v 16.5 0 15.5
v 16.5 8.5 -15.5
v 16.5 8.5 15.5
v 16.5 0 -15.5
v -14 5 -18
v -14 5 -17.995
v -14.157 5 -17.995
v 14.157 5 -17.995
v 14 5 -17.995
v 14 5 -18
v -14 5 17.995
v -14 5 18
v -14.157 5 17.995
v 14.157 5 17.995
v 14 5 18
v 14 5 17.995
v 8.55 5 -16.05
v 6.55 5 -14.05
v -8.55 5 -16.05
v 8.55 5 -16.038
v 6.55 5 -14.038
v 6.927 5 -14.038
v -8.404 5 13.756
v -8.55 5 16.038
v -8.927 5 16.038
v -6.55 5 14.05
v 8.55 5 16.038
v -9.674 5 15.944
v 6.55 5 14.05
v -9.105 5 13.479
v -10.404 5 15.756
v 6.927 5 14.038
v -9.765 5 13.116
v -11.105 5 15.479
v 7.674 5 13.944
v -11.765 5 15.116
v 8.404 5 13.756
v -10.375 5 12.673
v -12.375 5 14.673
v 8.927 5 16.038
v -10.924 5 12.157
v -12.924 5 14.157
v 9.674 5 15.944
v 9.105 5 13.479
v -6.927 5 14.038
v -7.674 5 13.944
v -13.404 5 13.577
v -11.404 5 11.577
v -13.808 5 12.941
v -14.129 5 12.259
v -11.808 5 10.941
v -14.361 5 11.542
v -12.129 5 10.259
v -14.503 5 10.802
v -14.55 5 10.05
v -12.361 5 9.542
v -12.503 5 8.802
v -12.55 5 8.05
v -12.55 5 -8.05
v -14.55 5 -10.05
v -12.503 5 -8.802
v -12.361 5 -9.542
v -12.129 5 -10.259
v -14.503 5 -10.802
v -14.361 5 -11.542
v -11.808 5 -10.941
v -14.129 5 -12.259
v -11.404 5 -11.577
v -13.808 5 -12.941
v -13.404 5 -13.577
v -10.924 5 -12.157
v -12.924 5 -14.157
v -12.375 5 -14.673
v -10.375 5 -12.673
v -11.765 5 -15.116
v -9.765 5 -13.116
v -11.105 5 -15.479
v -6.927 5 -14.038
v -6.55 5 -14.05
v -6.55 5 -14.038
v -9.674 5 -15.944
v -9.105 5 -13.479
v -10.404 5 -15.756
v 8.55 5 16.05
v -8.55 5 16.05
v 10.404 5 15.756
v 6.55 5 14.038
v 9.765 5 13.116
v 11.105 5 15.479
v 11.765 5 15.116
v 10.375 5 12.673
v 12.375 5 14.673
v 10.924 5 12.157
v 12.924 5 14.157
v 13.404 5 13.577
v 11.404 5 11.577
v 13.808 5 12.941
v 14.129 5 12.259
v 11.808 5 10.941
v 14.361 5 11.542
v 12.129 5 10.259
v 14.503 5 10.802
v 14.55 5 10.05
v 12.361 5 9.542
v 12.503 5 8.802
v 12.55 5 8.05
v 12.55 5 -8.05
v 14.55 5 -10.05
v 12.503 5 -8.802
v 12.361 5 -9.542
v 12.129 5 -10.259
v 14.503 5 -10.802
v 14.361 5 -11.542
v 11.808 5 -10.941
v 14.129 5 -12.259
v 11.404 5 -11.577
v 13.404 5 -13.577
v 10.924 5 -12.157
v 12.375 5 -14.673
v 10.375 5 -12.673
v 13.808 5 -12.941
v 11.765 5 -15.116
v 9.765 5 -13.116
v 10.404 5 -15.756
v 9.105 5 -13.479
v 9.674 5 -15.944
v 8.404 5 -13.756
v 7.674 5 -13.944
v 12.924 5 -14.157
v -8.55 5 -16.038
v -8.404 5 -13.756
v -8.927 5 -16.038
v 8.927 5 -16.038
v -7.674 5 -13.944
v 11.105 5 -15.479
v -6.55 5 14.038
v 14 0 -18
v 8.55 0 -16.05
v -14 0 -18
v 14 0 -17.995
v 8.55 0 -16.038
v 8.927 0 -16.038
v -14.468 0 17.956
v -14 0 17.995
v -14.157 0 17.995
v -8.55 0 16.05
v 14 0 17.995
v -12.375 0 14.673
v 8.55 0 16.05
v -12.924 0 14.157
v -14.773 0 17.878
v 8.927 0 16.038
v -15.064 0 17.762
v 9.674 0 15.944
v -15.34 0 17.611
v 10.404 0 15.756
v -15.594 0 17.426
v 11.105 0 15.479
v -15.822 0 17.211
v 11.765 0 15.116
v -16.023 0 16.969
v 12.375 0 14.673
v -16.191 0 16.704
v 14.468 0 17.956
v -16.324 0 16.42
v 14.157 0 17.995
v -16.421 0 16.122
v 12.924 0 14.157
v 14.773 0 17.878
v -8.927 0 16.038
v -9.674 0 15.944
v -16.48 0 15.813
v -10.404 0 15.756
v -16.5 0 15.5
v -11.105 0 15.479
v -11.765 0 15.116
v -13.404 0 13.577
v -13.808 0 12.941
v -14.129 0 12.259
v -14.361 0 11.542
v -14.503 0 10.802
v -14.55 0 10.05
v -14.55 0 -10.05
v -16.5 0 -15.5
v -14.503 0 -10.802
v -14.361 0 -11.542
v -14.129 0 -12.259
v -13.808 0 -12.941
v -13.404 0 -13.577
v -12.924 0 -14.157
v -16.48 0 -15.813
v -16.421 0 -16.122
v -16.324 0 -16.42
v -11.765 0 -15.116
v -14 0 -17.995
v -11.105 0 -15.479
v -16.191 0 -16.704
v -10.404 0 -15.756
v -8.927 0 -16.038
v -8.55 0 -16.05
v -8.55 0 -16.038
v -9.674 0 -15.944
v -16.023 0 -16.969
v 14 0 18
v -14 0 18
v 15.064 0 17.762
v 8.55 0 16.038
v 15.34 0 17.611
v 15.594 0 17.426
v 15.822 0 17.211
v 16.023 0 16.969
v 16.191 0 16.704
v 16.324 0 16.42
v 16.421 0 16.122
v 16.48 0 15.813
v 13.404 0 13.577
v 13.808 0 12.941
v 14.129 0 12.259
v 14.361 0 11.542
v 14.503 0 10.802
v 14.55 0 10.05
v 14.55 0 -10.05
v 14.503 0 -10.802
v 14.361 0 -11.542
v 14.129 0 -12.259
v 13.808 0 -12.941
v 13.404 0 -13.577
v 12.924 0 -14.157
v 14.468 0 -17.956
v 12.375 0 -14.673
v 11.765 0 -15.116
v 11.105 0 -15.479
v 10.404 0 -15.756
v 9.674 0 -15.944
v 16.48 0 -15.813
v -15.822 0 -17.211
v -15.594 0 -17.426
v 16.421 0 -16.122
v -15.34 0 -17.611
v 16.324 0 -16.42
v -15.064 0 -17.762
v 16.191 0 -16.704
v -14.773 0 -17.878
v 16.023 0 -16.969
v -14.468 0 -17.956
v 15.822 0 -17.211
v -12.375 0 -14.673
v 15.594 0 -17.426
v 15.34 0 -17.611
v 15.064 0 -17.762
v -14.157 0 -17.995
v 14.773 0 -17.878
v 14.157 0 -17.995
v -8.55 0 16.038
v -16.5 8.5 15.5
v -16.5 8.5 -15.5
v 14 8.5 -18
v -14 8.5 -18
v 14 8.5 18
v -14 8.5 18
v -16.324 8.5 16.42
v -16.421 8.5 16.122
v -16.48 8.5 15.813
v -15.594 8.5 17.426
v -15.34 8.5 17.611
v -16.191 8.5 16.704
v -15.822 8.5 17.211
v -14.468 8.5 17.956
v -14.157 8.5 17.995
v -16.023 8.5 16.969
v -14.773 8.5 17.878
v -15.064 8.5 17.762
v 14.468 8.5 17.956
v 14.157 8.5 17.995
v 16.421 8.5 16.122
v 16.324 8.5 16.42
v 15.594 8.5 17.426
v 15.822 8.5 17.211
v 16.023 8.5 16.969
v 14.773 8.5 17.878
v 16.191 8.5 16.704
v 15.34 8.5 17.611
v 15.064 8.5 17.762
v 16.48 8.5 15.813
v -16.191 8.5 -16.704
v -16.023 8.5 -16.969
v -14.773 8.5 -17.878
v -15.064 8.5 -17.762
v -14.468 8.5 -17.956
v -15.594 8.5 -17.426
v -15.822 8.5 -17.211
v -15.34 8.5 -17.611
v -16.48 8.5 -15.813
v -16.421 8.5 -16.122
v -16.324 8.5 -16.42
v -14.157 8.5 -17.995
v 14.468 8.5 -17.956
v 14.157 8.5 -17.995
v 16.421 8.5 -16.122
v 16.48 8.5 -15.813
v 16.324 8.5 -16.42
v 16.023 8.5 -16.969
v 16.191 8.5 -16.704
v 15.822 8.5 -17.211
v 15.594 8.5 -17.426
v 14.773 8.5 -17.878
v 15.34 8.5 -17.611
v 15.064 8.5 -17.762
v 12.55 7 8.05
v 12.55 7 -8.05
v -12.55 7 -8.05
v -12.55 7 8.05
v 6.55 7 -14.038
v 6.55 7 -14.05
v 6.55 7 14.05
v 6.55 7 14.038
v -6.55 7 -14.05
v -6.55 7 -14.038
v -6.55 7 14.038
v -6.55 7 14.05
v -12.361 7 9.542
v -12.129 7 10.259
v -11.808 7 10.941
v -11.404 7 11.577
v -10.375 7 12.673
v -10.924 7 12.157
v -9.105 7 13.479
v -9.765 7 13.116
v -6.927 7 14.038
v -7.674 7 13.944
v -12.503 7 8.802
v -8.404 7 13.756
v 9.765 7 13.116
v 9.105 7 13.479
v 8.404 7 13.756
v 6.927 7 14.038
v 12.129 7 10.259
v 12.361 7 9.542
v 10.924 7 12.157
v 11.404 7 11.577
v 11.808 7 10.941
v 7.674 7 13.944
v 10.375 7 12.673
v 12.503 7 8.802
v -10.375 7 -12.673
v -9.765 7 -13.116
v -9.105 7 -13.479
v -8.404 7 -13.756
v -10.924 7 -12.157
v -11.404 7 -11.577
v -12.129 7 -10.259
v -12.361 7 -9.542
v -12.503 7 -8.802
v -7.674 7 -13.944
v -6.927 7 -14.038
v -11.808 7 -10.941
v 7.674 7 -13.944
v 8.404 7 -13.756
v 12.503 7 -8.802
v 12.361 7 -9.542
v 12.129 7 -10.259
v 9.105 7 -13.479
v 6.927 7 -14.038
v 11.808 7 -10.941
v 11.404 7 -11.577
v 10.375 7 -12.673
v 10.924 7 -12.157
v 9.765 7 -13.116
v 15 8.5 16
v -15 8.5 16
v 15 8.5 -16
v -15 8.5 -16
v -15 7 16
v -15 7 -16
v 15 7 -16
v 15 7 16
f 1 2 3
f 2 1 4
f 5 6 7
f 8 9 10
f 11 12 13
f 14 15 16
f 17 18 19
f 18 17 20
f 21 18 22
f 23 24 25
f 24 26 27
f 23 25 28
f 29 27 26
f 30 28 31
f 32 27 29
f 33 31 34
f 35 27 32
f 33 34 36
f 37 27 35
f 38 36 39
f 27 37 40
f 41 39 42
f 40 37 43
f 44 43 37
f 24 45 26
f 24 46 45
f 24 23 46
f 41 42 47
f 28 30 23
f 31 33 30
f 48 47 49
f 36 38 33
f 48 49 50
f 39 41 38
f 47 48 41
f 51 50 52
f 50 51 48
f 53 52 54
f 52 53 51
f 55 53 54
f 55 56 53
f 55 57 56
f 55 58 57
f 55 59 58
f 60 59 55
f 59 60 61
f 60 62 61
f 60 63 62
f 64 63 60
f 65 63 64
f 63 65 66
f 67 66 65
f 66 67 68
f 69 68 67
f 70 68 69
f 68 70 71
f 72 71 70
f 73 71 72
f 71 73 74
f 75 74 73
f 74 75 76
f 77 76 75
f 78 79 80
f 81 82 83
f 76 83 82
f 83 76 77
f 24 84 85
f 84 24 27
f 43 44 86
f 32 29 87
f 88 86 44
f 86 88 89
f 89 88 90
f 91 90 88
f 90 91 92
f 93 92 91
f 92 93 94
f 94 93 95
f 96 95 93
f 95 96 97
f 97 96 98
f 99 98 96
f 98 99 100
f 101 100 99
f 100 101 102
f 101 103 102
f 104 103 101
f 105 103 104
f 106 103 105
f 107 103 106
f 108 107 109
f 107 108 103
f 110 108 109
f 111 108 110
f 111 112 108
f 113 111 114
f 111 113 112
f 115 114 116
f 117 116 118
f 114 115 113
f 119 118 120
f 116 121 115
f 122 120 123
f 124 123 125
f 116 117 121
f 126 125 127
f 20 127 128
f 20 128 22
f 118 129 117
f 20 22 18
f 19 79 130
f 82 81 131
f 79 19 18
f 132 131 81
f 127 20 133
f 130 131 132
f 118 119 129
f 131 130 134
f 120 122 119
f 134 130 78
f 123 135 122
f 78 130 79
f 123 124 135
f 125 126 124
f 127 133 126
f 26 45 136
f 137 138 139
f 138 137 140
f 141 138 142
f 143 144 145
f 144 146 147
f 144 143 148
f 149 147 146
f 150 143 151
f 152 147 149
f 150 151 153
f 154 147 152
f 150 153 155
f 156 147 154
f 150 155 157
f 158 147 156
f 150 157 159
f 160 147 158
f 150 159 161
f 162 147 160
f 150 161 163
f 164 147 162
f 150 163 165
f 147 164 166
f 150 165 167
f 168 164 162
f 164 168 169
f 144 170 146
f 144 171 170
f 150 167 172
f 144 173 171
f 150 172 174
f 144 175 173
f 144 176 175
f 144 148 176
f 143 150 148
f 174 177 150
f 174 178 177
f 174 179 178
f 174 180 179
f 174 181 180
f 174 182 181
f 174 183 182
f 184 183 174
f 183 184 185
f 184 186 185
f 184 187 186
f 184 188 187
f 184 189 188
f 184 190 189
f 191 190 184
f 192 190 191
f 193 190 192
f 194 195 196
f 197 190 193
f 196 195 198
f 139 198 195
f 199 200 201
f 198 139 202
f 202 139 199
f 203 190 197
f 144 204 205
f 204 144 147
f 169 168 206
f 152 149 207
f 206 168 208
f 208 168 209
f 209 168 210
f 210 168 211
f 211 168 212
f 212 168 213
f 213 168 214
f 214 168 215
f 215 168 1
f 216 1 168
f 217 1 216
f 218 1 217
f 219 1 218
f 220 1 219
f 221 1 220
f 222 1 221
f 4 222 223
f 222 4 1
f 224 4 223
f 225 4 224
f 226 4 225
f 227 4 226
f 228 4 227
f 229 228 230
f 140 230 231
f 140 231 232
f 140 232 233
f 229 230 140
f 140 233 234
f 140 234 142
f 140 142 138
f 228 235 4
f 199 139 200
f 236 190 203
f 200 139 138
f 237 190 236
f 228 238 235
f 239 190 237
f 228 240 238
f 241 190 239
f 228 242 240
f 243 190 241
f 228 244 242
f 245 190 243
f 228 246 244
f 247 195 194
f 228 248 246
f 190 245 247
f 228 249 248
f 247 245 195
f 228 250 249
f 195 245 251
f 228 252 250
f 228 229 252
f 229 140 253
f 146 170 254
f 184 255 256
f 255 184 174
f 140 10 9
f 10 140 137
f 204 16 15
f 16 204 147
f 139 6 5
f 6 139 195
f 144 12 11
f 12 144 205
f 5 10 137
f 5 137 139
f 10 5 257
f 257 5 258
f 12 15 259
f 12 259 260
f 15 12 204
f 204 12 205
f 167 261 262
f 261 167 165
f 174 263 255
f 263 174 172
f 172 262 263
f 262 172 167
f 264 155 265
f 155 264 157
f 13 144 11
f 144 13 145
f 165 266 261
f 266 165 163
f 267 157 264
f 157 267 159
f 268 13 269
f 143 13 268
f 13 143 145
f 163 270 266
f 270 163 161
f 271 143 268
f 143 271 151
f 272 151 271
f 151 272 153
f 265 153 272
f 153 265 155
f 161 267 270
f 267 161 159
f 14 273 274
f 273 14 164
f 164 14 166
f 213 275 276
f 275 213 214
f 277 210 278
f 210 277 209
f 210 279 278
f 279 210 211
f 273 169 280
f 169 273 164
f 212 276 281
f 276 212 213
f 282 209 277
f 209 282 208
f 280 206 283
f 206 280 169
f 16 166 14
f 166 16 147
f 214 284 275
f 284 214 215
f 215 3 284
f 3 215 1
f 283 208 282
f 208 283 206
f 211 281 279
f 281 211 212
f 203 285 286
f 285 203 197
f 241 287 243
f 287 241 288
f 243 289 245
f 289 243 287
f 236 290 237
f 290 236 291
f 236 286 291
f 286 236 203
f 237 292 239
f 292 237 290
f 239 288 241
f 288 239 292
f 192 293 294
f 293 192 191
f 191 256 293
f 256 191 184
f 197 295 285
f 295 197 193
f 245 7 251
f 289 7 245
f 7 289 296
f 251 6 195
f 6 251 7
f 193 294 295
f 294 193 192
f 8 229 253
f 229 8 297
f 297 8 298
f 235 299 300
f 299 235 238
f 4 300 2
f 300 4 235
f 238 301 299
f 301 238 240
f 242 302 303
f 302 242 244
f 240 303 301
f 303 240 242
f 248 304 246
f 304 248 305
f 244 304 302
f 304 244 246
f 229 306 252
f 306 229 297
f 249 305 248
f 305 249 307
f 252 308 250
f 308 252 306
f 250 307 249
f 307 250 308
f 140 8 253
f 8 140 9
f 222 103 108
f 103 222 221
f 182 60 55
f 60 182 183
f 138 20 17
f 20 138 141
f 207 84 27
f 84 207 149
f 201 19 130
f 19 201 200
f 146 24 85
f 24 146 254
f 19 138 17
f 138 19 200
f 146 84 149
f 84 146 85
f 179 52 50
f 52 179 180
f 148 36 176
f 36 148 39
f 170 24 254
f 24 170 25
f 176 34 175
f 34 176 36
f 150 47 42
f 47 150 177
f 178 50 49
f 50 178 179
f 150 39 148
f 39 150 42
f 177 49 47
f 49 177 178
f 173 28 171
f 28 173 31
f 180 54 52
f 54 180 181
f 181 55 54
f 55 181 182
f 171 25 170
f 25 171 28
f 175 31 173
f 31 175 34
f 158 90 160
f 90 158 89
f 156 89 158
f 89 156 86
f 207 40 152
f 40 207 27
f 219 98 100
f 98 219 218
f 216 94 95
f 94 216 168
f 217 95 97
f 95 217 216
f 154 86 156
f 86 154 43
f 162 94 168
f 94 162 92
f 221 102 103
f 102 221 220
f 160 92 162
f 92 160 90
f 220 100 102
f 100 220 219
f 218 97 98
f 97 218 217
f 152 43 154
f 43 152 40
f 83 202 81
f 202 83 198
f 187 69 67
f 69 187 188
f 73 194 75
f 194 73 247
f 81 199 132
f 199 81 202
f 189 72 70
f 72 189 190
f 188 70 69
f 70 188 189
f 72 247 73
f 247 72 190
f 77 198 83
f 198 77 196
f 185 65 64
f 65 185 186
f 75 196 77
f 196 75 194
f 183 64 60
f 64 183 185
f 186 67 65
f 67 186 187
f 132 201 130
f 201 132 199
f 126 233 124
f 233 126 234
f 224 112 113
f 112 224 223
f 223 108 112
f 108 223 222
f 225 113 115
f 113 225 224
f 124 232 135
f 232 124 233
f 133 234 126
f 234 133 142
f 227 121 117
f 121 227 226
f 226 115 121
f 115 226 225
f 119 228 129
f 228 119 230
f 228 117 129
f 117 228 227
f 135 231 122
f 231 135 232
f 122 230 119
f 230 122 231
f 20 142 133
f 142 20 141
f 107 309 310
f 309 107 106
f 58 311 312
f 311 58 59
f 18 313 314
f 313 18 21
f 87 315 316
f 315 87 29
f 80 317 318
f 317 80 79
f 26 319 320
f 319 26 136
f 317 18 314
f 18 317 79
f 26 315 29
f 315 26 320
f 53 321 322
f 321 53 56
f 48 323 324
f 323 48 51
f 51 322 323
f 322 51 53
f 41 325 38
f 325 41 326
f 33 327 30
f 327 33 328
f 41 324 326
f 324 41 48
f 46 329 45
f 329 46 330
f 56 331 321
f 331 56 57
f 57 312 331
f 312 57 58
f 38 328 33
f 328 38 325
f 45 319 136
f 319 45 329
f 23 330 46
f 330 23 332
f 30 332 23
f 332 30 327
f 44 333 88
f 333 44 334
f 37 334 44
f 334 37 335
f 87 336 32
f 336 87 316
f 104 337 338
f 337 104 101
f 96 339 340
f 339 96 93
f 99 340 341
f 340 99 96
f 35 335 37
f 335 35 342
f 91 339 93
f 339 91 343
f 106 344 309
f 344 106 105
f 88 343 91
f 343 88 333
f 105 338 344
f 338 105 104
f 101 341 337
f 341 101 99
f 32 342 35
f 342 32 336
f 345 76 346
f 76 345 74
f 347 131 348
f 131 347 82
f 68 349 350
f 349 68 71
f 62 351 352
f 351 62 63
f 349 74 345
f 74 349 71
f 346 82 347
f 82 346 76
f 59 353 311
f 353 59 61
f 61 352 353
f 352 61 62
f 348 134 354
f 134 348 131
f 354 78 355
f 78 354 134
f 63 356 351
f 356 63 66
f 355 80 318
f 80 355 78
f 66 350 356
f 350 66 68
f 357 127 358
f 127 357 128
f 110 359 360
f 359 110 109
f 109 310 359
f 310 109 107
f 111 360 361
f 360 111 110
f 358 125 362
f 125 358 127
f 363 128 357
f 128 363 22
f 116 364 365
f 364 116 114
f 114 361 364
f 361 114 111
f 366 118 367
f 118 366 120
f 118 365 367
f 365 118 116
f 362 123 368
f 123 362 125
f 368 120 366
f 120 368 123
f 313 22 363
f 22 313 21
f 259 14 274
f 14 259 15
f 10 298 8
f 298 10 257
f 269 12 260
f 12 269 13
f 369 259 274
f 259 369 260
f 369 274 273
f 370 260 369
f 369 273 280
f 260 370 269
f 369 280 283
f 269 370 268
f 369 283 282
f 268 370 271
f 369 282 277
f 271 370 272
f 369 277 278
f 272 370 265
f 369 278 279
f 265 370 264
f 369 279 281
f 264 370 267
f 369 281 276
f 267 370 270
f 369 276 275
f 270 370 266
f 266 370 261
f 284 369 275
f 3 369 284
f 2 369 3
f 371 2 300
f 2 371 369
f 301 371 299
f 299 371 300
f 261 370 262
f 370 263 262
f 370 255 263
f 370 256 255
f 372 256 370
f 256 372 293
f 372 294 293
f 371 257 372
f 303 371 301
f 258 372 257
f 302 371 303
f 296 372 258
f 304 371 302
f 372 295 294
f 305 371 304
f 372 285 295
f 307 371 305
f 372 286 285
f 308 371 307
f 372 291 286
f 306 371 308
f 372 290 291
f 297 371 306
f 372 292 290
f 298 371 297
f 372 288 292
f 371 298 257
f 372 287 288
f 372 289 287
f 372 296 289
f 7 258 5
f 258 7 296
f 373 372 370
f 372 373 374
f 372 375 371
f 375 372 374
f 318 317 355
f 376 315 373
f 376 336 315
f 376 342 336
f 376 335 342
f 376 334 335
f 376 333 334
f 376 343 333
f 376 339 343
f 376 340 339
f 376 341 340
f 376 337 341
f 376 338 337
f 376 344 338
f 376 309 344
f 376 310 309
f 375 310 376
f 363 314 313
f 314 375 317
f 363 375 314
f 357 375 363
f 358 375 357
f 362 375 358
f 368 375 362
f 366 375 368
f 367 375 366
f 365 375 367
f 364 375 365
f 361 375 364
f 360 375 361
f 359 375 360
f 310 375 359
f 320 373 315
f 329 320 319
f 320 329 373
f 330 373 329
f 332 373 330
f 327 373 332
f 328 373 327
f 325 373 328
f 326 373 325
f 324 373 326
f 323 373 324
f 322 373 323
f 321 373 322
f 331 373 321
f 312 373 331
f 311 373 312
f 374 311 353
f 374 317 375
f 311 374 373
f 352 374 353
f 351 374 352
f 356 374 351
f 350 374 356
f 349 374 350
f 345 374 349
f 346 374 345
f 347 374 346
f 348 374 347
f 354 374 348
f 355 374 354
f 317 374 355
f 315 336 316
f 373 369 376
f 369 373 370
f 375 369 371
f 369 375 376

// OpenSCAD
// file: RoundedRectangle.scad
// parameters
X = 50;
Y = 30;
THICKNESS = 2;
R = 2;
RESOLUTION = 50;

module RoundedRectangle(x, y, thickness, r, $fn=0) {

    translate([0, r, 0])
        cube([x, y-2*r, thickness]);
    translate([r, 0, 0])
        cube([x-2*r, y, thickness]);

    translate([r, r, 0])
        cylinder(r=r, h=thickness, $fn=$fn);
    translate([x-r, r, 0])
        cylinder(r=r, h=thickness, $fn=$fn);
    translate([r, y-r, 0])
        cylinder(r=r, h=thickness, $fn=$fn);
    translate([x-r, y-r, 0])
        cylinder(r=r, h=thickness, $fn=$fn);

}

// main
RoundedRectangle(x=X, y=Y, thickness=THICKNESS, r=R, $fn=RESOLUTION);
// main file
use <RoundedRectangle.scad>;

RESOLUTION = 50;
x_inner = 29.1;
y_inner = 32.1;
r_inner = 6;
x_base = 33;
y_base = 36;
margin = 3;
r = 2.5;
x = x_base;
y = y_base;
x_subtract = 30;
y_subtract = 32;


difference() {
    translate([-x_base/2.0, 0, y_base/2.0])
            rotate([-90, 0, 0])
                RoundedRectangle(x=x_base, y=y_base, r=r, thickness=5, $fn=RESOLUTION);
    
    translate([-x_inner/2.0, 0, y_inner/2.0])
            rotate([-90, 0, 0])
                RoundedRectangle(x=x_inner, y=y_inner, r=r_inner, thickness=6, $fn=RESOLUTION);
}

difference() {
    hull() {
        translate([-x_base/2.0, 5, y_base/2.0])
            rotate([-90, 0, 0])
                RoundedRectangle(x=x_base, y=y_base, r=r, thickness=2, $fn=RESOLUTION);
        
        translate([-x/2.0, 6, y/2.0])
            rotate([-90, 0, 0])
                RoundedRectangle(x=x, y=y, r=r, thickness=2.5, $fn=RESOLUTION);
    }
    
    // subtract
    translate([-x_subtract/2.0, 6+1, y_subtract/2.0])
        rotate([-90, 0, 0])
            cube([x_subtract, y_subtract, 3]);
    
    // inner
    translate([-(x_inner-4)/2.0, 0, (y_inner-4)/2.0])
        rotate([-90, 0, 0])
            RoundedRectangle(x=x_inner-4, y=y_inner-4, r=r_inner, thickness=10, $fn=RESOLUTION);
}
